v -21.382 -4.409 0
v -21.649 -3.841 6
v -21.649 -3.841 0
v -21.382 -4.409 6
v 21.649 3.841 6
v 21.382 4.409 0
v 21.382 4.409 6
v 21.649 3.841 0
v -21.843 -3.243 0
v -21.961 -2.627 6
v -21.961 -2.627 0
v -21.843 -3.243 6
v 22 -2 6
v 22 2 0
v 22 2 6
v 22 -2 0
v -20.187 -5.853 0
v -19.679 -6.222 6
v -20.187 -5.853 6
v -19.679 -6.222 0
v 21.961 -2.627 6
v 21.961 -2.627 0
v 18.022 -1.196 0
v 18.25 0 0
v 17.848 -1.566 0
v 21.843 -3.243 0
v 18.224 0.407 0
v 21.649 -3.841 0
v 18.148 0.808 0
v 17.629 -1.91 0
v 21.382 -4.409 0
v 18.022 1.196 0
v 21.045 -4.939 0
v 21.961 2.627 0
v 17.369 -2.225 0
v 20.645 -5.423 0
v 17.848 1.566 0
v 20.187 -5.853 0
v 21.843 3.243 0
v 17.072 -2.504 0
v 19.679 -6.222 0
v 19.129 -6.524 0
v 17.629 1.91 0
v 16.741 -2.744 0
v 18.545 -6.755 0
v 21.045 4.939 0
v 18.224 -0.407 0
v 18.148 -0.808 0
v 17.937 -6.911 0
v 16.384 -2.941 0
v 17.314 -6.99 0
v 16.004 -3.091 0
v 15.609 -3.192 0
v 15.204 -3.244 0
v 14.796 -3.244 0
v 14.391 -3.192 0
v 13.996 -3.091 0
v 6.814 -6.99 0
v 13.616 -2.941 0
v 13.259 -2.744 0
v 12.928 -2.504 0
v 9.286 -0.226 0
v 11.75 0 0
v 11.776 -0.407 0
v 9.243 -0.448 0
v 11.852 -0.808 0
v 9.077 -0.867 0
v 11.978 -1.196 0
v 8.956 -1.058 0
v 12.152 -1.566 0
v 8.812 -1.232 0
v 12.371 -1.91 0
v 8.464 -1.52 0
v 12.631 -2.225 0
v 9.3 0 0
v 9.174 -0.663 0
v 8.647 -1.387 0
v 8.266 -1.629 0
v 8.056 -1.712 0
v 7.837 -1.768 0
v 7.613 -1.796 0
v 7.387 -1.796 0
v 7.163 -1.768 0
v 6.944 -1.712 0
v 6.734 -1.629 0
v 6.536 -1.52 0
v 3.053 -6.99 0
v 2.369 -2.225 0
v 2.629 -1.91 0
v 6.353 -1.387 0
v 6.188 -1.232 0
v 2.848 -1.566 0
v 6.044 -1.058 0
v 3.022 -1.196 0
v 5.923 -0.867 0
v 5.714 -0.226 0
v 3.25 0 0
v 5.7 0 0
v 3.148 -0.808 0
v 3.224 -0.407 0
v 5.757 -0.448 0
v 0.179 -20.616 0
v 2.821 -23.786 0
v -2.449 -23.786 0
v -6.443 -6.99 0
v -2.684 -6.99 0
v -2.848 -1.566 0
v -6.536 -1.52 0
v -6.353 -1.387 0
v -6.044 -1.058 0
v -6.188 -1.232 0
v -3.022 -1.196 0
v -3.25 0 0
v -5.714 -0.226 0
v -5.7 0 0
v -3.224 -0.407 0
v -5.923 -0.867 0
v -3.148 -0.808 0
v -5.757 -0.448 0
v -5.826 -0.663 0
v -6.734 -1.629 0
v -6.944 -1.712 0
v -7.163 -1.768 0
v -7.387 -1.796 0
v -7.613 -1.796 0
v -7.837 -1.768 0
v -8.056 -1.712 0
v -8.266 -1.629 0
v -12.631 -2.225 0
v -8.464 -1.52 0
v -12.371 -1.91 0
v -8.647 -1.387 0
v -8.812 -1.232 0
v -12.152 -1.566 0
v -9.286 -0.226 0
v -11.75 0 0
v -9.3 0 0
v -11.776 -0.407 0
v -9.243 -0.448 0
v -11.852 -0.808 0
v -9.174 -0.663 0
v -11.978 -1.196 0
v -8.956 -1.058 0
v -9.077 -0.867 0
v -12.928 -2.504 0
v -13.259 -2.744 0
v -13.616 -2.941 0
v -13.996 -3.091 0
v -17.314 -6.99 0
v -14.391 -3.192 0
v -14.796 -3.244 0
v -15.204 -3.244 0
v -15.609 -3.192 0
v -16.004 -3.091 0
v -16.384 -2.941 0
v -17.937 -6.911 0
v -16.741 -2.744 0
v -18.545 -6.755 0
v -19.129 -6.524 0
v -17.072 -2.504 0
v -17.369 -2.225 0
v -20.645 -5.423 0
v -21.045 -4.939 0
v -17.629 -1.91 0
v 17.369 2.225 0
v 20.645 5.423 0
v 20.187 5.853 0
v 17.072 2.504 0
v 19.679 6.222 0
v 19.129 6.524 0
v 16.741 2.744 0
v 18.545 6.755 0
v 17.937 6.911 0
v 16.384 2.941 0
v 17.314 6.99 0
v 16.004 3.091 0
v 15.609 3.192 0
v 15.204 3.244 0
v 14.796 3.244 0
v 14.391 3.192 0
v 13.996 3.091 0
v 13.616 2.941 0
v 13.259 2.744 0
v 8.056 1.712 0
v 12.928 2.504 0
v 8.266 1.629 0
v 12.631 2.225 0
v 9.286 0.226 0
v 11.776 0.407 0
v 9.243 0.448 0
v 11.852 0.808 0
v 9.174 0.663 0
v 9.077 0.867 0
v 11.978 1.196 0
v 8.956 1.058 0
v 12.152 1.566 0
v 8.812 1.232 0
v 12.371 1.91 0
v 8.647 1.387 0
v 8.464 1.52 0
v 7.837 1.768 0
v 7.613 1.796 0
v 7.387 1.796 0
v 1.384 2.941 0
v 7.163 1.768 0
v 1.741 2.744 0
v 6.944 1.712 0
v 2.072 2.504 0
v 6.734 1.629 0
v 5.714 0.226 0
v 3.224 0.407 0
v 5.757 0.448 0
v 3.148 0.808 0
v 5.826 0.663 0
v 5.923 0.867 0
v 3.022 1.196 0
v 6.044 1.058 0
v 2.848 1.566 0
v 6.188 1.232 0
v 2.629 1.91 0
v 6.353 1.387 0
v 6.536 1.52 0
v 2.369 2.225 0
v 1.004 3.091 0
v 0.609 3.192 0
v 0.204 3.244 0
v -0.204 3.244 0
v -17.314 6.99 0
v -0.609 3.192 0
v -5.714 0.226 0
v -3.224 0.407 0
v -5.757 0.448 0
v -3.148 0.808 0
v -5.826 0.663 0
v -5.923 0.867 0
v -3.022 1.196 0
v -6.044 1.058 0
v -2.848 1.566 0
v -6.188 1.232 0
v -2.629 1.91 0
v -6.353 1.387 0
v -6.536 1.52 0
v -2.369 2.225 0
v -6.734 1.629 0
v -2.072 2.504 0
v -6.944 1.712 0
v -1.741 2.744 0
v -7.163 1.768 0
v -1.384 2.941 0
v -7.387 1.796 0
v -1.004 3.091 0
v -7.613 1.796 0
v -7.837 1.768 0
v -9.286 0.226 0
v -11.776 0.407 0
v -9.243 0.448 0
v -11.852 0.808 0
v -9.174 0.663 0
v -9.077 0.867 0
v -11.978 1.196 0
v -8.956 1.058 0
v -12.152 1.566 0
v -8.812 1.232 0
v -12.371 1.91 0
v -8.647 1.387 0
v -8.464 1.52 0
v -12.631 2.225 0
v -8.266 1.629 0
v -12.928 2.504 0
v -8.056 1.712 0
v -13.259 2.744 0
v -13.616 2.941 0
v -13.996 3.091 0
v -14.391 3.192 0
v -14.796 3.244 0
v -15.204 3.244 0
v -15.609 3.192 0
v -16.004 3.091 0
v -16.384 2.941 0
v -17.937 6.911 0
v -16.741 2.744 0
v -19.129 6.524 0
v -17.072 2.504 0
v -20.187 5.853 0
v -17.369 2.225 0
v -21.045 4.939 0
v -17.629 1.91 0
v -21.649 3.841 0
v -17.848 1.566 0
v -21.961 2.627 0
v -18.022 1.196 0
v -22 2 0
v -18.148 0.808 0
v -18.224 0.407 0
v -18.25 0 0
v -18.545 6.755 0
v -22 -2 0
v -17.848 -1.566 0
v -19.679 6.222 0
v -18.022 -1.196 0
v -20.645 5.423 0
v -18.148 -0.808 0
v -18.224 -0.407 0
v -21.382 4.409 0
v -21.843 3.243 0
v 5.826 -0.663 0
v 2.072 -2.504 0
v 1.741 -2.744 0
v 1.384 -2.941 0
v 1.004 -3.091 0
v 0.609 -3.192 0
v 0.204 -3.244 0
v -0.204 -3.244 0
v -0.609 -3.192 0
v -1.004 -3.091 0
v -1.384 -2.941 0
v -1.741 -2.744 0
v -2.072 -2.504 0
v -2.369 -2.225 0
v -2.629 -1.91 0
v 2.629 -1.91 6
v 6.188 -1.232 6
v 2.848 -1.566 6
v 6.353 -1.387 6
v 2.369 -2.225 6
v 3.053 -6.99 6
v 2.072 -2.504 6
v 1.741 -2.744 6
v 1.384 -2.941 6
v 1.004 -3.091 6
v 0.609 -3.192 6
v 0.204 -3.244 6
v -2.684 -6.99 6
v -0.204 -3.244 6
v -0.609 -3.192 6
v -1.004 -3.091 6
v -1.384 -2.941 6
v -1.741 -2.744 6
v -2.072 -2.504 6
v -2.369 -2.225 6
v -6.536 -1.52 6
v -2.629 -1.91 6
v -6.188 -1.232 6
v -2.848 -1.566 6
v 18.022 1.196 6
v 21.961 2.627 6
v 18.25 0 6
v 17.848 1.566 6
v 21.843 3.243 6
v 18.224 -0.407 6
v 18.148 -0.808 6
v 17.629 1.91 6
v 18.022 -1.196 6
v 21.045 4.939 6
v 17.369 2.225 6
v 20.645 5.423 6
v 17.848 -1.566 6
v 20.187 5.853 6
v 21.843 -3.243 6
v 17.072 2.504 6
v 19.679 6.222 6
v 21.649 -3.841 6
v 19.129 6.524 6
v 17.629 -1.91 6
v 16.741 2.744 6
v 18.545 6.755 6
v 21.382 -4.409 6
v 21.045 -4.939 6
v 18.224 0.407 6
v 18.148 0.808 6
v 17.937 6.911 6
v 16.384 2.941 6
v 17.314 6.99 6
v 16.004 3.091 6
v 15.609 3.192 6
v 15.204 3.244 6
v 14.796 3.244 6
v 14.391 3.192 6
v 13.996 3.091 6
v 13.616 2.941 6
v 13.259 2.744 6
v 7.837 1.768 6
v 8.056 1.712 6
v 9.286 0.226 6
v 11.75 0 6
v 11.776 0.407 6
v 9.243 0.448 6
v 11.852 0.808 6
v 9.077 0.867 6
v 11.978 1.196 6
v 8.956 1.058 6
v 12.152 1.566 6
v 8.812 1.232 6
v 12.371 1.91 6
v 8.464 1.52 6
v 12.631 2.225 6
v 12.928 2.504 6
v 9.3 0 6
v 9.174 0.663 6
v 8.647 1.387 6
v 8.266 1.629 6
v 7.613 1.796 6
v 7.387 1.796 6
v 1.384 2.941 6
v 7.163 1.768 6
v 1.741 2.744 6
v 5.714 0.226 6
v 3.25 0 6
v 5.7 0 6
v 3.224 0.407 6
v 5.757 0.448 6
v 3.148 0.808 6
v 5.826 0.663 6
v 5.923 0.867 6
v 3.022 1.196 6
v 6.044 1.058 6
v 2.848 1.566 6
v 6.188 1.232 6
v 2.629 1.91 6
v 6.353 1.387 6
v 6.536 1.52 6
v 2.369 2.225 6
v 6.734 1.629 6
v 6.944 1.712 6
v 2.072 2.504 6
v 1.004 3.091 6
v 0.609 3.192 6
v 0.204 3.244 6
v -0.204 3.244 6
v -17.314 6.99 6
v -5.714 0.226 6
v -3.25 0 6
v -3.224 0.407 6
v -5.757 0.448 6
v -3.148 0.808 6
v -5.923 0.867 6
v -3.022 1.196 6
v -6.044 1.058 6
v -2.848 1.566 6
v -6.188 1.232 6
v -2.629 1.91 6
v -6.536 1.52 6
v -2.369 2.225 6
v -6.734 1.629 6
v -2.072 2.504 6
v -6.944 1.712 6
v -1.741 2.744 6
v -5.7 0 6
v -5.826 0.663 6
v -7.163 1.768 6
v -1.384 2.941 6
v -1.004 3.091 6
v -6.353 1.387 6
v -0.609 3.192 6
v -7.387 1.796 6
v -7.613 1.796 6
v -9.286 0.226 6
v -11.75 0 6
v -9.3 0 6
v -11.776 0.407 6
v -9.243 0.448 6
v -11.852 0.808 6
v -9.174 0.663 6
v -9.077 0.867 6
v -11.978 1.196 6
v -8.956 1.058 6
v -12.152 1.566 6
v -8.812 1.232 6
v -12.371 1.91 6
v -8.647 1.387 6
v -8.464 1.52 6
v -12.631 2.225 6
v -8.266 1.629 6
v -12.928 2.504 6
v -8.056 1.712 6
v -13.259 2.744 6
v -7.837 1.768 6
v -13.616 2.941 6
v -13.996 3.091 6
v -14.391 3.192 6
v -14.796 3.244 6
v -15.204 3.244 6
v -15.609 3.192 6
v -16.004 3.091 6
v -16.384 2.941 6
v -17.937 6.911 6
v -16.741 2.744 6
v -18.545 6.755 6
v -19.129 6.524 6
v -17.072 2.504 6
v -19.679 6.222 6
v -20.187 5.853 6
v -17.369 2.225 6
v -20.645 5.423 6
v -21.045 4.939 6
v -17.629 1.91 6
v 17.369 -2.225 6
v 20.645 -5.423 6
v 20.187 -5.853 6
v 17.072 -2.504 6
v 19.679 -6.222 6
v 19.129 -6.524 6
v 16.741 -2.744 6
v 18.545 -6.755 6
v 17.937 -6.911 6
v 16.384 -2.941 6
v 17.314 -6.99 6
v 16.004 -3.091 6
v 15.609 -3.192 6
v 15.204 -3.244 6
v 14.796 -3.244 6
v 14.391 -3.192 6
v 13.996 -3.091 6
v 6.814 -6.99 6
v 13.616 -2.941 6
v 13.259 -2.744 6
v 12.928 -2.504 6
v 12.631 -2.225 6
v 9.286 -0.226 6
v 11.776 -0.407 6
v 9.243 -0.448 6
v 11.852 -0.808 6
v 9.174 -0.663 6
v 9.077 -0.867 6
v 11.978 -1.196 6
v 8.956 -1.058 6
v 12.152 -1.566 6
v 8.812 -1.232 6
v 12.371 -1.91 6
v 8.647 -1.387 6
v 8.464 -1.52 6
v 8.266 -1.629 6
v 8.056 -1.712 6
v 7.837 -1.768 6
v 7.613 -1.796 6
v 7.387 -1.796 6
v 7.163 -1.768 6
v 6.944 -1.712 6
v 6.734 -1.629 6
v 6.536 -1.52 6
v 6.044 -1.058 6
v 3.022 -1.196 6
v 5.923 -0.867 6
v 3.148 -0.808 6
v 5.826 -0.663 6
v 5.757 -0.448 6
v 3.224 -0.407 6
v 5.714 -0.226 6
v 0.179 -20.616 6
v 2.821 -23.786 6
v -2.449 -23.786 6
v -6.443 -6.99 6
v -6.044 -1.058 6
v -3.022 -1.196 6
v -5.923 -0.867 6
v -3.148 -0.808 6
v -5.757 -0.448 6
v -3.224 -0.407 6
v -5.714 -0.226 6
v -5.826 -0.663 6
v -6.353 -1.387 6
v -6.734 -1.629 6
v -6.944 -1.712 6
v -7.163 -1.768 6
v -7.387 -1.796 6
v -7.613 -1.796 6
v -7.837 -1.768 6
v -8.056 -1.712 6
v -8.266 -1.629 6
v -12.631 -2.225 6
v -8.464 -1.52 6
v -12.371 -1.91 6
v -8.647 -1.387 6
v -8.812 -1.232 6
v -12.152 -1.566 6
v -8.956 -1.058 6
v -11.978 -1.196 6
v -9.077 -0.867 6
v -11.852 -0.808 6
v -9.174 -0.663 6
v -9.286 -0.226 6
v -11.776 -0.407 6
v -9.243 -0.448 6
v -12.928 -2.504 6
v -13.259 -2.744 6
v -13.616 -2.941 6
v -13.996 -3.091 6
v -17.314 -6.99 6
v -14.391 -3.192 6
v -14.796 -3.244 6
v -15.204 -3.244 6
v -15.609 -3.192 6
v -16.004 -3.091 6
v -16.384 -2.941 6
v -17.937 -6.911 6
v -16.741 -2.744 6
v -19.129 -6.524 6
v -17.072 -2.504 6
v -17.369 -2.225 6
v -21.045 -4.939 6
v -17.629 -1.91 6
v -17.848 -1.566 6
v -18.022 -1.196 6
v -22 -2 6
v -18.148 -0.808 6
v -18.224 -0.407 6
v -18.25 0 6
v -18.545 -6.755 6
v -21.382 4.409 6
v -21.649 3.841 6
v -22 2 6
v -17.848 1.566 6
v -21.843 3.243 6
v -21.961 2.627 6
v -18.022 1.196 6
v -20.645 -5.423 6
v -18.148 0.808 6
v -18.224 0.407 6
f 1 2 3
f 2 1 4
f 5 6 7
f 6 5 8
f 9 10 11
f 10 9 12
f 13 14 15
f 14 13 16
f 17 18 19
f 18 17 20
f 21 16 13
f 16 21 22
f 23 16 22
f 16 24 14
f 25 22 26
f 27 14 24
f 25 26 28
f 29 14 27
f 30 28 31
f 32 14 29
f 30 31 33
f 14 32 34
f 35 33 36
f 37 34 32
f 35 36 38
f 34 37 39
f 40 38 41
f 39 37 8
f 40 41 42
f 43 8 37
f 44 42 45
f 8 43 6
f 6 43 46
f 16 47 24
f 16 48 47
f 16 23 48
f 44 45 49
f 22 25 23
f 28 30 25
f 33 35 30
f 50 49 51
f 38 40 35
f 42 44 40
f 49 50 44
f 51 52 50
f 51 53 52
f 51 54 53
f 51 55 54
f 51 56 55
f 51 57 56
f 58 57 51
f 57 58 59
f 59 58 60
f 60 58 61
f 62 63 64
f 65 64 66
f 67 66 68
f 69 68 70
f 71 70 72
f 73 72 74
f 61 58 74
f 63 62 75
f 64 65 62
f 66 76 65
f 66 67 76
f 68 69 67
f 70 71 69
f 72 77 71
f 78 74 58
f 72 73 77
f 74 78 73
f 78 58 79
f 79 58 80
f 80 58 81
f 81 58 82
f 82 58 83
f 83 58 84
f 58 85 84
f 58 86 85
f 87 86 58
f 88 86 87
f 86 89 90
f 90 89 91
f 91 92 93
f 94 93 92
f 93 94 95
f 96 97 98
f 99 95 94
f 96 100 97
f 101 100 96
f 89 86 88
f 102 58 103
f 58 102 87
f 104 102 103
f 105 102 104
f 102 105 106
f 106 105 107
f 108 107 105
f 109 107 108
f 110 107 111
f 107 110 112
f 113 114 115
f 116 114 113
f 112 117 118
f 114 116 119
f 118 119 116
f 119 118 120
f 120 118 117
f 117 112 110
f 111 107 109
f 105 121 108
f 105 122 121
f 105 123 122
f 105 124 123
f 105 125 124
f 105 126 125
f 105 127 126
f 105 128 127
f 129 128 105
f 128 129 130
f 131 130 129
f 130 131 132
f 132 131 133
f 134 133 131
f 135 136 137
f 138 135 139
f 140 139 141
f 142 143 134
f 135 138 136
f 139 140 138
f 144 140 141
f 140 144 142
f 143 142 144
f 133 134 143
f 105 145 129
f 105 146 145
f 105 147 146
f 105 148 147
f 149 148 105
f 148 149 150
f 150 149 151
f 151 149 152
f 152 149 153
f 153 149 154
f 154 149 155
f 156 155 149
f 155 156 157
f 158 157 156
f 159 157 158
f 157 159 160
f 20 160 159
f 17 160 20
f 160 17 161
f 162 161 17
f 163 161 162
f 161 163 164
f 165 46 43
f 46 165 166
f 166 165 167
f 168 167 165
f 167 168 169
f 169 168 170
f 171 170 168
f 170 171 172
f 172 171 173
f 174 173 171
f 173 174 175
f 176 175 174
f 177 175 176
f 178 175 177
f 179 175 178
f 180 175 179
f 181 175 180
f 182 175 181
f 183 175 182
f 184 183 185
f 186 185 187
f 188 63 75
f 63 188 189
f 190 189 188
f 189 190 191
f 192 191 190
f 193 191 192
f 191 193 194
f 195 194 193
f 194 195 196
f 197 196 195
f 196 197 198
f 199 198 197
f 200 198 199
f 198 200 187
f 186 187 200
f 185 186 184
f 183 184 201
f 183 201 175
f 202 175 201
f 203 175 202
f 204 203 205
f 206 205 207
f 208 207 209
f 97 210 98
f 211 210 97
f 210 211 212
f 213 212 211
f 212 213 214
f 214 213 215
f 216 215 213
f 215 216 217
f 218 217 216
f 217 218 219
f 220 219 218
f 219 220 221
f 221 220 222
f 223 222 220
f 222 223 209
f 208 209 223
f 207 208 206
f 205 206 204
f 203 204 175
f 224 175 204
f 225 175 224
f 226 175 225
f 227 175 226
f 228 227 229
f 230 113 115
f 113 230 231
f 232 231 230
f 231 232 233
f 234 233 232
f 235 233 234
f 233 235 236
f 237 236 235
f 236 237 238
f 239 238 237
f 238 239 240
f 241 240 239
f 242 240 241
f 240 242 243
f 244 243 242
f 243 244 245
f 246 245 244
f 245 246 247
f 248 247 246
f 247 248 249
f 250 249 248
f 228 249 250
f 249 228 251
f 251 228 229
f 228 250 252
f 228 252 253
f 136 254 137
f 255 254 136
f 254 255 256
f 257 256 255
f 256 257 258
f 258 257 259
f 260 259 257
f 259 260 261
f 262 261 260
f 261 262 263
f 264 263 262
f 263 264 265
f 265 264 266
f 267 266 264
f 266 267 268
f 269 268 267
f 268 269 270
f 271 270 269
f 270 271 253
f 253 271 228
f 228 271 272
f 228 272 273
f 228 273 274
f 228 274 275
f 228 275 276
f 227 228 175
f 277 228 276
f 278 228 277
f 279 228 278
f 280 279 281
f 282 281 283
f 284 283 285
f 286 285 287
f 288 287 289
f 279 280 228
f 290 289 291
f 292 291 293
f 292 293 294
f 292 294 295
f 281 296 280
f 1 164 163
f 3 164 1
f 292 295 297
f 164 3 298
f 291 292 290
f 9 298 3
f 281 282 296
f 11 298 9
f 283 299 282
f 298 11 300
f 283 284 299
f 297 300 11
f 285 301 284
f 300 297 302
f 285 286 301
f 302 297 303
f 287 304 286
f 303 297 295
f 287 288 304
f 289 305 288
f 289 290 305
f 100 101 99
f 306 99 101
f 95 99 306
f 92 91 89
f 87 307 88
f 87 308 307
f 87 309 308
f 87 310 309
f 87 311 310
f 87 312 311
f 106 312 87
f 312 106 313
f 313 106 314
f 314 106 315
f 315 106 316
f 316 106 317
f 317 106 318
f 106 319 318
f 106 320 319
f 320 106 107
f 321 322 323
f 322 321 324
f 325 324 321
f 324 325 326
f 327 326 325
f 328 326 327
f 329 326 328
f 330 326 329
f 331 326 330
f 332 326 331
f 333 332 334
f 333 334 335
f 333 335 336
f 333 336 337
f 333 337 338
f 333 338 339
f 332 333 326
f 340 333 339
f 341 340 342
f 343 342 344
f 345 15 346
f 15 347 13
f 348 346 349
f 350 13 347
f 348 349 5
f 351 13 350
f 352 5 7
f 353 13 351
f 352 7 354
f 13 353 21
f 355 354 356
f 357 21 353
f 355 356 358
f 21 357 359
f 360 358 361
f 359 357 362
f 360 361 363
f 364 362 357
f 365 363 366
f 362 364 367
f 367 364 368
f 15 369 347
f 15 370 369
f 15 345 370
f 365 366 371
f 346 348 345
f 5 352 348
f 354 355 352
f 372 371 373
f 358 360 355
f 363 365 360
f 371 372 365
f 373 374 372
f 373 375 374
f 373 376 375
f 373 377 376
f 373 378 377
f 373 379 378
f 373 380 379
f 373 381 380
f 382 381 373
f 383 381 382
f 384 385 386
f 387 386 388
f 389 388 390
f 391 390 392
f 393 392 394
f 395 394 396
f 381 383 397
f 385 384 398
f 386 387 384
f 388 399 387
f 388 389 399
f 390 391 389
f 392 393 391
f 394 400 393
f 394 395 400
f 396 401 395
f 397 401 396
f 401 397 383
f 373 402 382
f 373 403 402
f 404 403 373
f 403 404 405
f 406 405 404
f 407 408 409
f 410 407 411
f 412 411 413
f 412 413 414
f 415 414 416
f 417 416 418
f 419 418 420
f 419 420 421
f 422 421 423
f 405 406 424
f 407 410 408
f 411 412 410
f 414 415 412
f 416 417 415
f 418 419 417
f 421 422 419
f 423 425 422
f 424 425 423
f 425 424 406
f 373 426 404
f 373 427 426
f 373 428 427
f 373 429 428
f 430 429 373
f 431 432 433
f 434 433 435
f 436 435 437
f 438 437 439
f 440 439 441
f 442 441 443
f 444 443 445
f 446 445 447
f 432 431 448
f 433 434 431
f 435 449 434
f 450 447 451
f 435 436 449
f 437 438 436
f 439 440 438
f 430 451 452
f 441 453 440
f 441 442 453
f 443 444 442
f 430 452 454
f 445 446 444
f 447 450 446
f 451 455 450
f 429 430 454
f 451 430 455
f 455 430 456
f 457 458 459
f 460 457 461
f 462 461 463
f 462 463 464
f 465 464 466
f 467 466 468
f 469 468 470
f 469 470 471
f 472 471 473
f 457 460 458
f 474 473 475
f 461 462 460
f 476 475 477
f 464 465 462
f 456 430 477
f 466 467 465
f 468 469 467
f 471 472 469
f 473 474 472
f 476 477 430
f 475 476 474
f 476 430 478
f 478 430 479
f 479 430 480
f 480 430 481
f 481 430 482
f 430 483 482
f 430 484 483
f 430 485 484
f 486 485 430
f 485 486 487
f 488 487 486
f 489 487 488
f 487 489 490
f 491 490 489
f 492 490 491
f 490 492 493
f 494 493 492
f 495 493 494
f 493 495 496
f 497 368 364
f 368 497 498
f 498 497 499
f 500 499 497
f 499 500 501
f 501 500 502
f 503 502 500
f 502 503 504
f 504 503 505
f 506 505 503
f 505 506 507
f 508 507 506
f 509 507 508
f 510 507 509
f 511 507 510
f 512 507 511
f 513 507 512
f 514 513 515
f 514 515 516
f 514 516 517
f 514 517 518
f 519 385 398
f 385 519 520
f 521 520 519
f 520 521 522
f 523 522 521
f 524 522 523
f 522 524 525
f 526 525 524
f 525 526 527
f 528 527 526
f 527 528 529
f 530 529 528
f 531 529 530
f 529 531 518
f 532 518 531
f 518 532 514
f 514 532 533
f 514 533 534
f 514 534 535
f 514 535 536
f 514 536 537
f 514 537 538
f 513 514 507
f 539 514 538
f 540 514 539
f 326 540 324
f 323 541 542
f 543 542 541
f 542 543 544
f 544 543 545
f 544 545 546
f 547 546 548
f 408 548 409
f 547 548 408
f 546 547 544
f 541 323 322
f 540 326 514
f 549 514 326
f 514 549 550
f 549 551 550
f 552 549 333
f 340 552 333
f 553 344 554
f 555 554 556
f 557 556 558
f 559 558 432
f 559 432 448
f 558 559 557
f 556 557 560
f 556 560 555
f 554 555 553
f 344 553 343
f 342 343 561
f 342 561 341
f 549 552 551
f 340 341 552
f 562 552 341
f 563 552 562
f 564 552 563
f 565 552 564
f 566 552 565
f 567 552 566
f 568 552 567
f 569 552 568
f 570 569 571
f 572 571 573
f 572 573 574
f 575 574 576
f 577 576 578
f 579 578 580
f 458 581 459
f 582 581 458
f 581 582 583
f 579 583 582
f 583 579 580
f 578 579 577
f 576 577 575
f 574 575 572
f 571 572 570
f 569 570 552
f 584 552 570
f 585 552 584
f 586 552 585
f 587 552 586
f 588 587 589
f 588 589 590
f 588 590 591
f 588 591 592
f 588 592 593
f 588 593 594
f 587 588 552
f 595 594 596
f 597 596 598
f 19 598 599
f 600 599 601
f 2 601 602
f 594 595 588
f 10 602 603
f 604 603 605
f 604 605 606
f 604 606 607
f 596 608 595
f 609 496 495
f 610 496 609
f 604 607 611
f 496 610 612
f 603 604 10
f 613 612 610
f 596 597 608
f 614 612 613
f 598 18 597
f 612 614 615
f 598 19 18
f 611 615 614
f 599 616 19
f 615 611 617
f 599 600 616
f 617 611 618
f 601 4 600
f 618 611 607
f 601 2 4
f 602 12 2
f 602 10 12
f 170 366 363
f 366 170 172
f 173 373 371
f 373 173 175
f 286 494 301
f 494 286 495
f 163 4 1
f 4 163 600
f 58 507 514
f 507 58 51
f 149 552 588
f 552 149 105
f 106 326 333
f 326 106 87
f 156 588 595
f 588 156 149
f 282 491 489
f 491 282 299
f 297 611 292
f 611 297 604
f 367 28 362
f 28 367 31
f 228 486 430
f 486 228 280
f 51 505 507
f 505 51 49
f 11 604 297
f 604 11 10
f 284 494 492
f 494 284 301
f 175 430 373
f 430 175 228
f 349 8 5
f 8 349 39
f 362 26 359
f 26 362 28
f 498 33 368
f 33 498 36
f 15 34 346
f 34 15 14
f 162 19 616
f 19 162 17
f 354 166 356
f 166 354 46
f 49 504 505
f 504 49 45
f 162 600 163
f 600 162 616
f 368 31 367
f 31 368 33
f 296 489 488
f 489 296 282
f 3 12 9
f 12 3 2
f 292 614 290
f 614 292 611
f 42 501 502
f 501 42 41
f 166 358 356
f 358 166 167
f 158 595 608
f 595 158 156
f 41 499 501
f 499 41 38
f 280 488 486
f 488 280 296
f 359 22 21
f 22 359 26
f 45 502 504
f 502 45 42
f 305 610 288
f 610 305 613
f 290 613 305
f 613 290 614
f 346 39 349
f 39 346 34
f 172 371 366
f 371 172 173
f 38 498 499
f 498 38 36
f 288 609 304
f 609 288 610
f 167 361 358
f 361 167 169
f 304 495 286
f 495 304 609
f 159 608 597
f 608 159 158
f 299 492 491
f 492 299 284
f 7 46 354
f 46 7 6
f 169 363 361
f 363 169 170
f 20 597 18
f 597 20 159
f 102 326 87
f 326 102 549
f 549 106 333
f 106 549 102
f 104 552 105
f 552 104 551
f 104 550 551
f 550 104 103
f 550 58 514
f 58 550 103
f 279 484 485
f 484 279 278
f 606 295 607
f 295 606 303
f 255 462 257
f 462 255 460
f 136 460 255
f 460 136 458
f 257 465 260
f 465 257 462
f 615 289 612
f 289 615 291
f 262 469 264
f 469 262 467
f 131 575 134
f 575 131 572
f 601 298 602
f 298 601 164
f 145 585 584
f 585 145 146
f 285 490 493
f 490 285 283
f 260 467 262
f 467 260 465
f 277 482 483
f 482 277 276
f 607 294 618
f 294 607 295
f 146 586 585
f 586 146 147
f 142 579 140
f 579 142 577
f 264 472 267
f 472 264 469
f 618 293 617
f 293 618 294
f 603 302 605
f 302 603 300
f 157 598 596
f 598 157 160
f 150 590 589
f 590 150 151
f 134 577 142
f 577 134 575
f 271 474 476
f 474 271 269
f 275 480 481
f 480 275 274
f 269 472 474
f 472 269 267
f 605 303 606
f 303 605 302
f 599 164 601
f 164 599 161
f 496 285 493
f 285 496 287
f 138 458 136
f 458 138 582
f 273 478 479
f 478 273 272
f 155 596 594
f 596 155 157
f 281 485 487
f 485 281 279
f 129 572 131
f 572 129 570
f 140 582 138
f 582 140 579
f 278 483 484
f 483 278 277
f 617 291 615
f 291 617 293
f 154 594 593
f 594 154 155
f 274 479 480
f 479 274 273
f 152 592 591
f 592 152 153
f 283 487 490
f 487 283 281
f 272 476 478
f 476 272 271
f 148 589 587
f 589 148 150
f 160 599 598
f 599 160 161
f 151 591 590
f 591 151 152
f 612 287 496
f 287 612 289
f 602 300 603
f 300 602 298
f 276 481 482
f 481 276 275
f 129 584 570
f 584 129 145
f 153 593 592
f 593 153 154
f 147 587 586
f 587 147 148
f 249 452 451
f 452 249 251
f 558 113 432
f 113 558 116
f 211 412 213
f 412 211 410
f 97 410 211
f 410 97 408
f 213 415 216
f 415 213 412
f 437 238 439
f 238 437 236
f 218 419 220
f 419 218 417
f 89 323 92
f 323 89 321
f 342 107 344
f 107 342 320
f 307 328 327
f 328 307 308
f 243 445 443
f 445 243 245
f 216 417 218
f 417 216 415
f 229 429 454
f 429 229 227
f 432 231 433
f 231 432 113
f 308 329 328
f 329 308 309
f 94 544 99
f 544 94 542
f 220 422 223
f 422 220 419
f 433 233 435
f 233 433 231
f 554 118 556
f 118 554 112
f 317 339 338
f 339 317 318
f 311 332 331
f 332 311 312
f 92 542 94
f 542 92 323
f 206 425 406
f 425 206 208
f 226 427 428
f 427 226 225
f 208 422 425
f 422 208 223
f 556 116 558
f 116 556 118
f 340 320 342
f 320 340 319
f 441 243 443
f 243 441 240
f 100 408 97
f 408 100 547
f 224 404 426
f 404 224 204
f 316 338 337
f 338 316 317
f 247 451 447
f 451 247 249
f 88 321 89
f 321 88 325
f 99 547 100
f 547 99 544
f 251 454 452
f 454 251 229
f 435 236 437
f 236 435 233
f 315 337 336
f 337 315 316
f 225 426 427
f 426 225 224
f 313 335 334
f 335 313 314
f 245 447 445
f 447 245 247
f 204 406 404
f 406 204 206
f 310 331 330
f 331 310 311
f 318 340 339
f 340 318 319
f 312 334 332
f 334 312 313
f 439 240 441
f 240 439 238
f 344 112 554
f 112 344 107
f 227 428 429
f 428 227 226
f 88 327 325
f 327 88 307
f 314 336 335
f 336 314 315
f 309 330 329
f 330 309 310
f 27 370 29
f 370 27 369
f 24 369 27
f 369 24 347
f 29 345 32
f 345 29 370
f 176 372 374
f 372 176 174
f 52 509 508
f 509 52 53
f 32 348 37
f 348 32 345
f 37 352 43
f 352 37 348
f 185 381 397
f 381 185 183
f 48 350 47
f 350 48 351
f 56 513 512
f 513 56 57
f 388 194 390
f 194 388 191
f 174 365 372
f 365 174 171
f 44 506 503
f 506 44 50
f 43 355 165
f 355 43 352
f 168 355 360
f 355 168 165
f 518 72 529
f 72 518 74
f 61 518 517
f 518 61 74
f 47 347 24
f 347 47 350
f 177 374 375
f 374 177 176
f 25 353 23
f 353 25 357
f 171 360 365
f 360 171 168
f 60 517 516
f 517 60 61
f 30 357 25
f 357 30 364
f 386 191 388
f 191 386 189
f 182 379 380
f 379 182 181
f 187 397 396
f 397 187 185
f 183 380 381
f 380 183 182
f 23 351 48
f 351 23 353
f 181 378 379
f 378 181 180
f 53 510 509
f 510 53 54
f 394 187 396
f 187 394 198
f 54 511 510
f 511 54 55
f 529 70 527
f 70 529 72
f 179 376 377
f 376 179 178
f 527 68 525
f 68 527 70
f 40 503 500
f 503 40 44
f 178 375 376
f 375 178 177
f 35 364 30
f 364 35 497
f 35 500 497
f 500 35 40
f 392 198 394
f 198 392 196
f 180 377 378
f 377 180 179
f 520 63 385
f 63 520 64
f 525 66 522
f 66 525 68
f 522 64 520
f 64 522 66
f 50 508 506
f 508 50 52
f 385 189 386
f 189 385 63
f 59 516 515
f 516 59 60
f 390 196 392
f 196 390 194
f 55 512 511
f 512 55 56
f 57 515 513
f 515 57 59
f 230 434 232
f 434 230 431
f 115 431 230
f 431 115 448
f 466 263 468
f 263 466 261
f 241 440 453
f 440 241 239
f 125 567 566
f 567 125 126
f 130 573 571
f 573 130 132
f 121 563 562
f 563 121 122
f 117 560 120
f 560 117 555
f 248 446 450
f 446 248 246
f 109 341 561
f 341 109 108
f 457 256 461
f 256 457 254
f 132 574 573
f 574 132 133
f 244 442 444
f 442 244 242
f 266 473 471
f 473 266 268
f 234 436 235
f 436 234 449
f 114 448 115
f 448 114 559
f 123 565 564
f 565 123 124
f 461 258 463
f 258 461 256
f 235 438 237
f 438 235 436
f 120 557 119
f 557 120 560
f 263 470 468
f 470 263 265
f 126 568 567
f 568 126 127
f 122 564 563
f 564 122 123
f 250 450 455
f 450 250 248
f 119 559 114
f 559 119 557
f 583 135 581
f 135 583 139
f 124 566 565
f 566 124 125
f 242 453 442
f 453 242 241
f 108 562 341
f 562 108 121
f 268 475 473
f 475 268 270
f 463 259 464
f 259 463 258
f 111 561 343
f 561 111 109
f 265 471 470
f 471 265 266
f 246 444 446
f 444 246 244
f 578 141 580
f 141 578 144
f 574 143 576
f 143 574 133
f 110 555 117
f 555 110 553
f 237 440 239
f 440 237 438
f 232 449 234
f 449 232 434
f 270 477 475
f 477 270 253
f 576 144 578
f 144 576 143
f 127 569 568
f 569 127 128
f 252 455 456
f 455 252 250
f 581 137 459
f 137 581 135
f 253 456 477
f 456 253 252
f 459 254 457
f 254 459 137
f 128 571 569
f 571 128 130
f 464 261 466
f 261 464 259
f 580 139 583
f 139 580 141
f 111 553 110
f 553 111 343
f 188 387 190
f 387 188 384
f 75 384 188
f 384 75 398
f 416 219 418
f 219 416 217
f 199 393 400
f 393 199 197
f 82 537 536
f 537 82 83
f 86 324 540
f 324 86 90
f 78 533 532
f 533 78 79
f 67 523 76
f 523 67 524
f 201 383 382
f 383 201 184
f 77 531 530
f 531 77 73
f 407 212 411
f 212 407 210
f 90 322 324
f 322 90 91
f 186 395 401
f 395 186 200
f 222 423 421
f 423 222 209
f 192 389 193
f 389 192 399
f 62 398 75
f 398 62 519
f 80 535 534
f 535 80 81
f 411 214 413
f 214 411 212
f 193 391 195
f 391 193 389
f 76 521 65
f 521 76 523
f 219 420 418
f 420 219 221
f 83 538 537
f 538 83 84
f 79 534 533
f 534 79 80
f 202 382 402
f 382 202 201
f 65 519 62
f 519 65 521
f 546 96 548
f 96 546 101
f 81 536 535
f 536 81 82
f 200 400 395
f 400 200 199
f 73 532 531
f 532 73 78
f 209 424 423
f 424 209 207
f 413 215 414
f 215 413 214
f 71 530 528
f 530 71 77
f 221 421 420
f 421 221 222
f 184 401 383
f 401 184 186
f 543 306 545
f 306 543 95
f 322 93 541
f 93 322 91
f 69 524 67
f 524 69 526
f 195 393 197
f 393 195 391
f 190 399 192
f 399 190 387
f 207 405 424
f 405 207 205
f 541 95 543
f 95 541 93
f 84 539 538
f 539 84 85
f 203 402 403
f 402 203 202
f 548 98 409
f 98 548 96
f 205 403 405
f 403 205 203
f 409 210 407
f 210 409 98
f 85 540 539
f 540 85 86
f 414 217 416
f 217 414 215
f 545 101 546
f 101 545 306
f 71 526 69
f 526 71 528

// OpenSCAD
$fn = 50;


difference() {
	union() {
		hull() {
			translate(v = [-17.0000000000, 2.0000000000, 0]) {
				cylinder(h = 6, r = 5);
			}
			translate(v = [17.0000000000, 2.0000000000, 0]) {
				cylinder(h = 6, r = 5);
			}
			translate(v = [-17.0000000000, -2.0000000000, 0]) {
				cylinder(h = 6, r = 5);
			}
			translate(v = [17.0000000000, -2.0000000000, 0]) {
				cylinder(h = 6, r = 5);
			}
		}
		translate(v = [0, -5, 0]) {
			linear_extrude(height = 6) {
				text(font = "DejaVu Sans Mono:style=Bold", halign = "center", size = 19.0000000000, text = "V", valign = "top");
			}
		}
	}
	union() {
		translate(v = [-15.0000000000, 0.0000000000, 0]) {
			translate(v = [0, 0, -100]) {
				cylinder(h = 200, r = 3.2500000000);
			}
		}
		translate(v = [0, 0, -100]) {
			cylinder(h = 200, r = 3.2500000000);
		}
		translate(v = [15.0000000000, 0.0000000000, 0]) {
			translate(v = [0, 0, -100]) {
				cylinder(h = 200, r = 3.2500000000);
			}
		}
		translate(v = [-15.0000000000, 0.0000000000, 0]) {
			translate(v = [0, 0, -100]) {
				cylinder(h = 200, r = 1.8000000000);
			}
		}
		translate(v = [-7.5000000000, 0.0000000000, 0]) {
			translate(v = [0, 0, -100]) {
				cylinder(h = 200, r = 1.8000000000);
			}
		}
		translate(v = [0, 0, -100]) {
			cylinder(h = 200, r = 1.8000000000);
		}
		translate(v = [7.5000000000, 0.0000000000, 0]) {
			translate(v = [0, 0, -100]) {
				cylinder(h = 200, r = 1.8000000000);
			}
		}
		translate(v = [15.0000000000, 0.0000000000, 0]) {
			translate(v = [0, 0, -100]) {
				cylinder(h = 200, r = 1.8000000000);
			}
		}
	}
}
